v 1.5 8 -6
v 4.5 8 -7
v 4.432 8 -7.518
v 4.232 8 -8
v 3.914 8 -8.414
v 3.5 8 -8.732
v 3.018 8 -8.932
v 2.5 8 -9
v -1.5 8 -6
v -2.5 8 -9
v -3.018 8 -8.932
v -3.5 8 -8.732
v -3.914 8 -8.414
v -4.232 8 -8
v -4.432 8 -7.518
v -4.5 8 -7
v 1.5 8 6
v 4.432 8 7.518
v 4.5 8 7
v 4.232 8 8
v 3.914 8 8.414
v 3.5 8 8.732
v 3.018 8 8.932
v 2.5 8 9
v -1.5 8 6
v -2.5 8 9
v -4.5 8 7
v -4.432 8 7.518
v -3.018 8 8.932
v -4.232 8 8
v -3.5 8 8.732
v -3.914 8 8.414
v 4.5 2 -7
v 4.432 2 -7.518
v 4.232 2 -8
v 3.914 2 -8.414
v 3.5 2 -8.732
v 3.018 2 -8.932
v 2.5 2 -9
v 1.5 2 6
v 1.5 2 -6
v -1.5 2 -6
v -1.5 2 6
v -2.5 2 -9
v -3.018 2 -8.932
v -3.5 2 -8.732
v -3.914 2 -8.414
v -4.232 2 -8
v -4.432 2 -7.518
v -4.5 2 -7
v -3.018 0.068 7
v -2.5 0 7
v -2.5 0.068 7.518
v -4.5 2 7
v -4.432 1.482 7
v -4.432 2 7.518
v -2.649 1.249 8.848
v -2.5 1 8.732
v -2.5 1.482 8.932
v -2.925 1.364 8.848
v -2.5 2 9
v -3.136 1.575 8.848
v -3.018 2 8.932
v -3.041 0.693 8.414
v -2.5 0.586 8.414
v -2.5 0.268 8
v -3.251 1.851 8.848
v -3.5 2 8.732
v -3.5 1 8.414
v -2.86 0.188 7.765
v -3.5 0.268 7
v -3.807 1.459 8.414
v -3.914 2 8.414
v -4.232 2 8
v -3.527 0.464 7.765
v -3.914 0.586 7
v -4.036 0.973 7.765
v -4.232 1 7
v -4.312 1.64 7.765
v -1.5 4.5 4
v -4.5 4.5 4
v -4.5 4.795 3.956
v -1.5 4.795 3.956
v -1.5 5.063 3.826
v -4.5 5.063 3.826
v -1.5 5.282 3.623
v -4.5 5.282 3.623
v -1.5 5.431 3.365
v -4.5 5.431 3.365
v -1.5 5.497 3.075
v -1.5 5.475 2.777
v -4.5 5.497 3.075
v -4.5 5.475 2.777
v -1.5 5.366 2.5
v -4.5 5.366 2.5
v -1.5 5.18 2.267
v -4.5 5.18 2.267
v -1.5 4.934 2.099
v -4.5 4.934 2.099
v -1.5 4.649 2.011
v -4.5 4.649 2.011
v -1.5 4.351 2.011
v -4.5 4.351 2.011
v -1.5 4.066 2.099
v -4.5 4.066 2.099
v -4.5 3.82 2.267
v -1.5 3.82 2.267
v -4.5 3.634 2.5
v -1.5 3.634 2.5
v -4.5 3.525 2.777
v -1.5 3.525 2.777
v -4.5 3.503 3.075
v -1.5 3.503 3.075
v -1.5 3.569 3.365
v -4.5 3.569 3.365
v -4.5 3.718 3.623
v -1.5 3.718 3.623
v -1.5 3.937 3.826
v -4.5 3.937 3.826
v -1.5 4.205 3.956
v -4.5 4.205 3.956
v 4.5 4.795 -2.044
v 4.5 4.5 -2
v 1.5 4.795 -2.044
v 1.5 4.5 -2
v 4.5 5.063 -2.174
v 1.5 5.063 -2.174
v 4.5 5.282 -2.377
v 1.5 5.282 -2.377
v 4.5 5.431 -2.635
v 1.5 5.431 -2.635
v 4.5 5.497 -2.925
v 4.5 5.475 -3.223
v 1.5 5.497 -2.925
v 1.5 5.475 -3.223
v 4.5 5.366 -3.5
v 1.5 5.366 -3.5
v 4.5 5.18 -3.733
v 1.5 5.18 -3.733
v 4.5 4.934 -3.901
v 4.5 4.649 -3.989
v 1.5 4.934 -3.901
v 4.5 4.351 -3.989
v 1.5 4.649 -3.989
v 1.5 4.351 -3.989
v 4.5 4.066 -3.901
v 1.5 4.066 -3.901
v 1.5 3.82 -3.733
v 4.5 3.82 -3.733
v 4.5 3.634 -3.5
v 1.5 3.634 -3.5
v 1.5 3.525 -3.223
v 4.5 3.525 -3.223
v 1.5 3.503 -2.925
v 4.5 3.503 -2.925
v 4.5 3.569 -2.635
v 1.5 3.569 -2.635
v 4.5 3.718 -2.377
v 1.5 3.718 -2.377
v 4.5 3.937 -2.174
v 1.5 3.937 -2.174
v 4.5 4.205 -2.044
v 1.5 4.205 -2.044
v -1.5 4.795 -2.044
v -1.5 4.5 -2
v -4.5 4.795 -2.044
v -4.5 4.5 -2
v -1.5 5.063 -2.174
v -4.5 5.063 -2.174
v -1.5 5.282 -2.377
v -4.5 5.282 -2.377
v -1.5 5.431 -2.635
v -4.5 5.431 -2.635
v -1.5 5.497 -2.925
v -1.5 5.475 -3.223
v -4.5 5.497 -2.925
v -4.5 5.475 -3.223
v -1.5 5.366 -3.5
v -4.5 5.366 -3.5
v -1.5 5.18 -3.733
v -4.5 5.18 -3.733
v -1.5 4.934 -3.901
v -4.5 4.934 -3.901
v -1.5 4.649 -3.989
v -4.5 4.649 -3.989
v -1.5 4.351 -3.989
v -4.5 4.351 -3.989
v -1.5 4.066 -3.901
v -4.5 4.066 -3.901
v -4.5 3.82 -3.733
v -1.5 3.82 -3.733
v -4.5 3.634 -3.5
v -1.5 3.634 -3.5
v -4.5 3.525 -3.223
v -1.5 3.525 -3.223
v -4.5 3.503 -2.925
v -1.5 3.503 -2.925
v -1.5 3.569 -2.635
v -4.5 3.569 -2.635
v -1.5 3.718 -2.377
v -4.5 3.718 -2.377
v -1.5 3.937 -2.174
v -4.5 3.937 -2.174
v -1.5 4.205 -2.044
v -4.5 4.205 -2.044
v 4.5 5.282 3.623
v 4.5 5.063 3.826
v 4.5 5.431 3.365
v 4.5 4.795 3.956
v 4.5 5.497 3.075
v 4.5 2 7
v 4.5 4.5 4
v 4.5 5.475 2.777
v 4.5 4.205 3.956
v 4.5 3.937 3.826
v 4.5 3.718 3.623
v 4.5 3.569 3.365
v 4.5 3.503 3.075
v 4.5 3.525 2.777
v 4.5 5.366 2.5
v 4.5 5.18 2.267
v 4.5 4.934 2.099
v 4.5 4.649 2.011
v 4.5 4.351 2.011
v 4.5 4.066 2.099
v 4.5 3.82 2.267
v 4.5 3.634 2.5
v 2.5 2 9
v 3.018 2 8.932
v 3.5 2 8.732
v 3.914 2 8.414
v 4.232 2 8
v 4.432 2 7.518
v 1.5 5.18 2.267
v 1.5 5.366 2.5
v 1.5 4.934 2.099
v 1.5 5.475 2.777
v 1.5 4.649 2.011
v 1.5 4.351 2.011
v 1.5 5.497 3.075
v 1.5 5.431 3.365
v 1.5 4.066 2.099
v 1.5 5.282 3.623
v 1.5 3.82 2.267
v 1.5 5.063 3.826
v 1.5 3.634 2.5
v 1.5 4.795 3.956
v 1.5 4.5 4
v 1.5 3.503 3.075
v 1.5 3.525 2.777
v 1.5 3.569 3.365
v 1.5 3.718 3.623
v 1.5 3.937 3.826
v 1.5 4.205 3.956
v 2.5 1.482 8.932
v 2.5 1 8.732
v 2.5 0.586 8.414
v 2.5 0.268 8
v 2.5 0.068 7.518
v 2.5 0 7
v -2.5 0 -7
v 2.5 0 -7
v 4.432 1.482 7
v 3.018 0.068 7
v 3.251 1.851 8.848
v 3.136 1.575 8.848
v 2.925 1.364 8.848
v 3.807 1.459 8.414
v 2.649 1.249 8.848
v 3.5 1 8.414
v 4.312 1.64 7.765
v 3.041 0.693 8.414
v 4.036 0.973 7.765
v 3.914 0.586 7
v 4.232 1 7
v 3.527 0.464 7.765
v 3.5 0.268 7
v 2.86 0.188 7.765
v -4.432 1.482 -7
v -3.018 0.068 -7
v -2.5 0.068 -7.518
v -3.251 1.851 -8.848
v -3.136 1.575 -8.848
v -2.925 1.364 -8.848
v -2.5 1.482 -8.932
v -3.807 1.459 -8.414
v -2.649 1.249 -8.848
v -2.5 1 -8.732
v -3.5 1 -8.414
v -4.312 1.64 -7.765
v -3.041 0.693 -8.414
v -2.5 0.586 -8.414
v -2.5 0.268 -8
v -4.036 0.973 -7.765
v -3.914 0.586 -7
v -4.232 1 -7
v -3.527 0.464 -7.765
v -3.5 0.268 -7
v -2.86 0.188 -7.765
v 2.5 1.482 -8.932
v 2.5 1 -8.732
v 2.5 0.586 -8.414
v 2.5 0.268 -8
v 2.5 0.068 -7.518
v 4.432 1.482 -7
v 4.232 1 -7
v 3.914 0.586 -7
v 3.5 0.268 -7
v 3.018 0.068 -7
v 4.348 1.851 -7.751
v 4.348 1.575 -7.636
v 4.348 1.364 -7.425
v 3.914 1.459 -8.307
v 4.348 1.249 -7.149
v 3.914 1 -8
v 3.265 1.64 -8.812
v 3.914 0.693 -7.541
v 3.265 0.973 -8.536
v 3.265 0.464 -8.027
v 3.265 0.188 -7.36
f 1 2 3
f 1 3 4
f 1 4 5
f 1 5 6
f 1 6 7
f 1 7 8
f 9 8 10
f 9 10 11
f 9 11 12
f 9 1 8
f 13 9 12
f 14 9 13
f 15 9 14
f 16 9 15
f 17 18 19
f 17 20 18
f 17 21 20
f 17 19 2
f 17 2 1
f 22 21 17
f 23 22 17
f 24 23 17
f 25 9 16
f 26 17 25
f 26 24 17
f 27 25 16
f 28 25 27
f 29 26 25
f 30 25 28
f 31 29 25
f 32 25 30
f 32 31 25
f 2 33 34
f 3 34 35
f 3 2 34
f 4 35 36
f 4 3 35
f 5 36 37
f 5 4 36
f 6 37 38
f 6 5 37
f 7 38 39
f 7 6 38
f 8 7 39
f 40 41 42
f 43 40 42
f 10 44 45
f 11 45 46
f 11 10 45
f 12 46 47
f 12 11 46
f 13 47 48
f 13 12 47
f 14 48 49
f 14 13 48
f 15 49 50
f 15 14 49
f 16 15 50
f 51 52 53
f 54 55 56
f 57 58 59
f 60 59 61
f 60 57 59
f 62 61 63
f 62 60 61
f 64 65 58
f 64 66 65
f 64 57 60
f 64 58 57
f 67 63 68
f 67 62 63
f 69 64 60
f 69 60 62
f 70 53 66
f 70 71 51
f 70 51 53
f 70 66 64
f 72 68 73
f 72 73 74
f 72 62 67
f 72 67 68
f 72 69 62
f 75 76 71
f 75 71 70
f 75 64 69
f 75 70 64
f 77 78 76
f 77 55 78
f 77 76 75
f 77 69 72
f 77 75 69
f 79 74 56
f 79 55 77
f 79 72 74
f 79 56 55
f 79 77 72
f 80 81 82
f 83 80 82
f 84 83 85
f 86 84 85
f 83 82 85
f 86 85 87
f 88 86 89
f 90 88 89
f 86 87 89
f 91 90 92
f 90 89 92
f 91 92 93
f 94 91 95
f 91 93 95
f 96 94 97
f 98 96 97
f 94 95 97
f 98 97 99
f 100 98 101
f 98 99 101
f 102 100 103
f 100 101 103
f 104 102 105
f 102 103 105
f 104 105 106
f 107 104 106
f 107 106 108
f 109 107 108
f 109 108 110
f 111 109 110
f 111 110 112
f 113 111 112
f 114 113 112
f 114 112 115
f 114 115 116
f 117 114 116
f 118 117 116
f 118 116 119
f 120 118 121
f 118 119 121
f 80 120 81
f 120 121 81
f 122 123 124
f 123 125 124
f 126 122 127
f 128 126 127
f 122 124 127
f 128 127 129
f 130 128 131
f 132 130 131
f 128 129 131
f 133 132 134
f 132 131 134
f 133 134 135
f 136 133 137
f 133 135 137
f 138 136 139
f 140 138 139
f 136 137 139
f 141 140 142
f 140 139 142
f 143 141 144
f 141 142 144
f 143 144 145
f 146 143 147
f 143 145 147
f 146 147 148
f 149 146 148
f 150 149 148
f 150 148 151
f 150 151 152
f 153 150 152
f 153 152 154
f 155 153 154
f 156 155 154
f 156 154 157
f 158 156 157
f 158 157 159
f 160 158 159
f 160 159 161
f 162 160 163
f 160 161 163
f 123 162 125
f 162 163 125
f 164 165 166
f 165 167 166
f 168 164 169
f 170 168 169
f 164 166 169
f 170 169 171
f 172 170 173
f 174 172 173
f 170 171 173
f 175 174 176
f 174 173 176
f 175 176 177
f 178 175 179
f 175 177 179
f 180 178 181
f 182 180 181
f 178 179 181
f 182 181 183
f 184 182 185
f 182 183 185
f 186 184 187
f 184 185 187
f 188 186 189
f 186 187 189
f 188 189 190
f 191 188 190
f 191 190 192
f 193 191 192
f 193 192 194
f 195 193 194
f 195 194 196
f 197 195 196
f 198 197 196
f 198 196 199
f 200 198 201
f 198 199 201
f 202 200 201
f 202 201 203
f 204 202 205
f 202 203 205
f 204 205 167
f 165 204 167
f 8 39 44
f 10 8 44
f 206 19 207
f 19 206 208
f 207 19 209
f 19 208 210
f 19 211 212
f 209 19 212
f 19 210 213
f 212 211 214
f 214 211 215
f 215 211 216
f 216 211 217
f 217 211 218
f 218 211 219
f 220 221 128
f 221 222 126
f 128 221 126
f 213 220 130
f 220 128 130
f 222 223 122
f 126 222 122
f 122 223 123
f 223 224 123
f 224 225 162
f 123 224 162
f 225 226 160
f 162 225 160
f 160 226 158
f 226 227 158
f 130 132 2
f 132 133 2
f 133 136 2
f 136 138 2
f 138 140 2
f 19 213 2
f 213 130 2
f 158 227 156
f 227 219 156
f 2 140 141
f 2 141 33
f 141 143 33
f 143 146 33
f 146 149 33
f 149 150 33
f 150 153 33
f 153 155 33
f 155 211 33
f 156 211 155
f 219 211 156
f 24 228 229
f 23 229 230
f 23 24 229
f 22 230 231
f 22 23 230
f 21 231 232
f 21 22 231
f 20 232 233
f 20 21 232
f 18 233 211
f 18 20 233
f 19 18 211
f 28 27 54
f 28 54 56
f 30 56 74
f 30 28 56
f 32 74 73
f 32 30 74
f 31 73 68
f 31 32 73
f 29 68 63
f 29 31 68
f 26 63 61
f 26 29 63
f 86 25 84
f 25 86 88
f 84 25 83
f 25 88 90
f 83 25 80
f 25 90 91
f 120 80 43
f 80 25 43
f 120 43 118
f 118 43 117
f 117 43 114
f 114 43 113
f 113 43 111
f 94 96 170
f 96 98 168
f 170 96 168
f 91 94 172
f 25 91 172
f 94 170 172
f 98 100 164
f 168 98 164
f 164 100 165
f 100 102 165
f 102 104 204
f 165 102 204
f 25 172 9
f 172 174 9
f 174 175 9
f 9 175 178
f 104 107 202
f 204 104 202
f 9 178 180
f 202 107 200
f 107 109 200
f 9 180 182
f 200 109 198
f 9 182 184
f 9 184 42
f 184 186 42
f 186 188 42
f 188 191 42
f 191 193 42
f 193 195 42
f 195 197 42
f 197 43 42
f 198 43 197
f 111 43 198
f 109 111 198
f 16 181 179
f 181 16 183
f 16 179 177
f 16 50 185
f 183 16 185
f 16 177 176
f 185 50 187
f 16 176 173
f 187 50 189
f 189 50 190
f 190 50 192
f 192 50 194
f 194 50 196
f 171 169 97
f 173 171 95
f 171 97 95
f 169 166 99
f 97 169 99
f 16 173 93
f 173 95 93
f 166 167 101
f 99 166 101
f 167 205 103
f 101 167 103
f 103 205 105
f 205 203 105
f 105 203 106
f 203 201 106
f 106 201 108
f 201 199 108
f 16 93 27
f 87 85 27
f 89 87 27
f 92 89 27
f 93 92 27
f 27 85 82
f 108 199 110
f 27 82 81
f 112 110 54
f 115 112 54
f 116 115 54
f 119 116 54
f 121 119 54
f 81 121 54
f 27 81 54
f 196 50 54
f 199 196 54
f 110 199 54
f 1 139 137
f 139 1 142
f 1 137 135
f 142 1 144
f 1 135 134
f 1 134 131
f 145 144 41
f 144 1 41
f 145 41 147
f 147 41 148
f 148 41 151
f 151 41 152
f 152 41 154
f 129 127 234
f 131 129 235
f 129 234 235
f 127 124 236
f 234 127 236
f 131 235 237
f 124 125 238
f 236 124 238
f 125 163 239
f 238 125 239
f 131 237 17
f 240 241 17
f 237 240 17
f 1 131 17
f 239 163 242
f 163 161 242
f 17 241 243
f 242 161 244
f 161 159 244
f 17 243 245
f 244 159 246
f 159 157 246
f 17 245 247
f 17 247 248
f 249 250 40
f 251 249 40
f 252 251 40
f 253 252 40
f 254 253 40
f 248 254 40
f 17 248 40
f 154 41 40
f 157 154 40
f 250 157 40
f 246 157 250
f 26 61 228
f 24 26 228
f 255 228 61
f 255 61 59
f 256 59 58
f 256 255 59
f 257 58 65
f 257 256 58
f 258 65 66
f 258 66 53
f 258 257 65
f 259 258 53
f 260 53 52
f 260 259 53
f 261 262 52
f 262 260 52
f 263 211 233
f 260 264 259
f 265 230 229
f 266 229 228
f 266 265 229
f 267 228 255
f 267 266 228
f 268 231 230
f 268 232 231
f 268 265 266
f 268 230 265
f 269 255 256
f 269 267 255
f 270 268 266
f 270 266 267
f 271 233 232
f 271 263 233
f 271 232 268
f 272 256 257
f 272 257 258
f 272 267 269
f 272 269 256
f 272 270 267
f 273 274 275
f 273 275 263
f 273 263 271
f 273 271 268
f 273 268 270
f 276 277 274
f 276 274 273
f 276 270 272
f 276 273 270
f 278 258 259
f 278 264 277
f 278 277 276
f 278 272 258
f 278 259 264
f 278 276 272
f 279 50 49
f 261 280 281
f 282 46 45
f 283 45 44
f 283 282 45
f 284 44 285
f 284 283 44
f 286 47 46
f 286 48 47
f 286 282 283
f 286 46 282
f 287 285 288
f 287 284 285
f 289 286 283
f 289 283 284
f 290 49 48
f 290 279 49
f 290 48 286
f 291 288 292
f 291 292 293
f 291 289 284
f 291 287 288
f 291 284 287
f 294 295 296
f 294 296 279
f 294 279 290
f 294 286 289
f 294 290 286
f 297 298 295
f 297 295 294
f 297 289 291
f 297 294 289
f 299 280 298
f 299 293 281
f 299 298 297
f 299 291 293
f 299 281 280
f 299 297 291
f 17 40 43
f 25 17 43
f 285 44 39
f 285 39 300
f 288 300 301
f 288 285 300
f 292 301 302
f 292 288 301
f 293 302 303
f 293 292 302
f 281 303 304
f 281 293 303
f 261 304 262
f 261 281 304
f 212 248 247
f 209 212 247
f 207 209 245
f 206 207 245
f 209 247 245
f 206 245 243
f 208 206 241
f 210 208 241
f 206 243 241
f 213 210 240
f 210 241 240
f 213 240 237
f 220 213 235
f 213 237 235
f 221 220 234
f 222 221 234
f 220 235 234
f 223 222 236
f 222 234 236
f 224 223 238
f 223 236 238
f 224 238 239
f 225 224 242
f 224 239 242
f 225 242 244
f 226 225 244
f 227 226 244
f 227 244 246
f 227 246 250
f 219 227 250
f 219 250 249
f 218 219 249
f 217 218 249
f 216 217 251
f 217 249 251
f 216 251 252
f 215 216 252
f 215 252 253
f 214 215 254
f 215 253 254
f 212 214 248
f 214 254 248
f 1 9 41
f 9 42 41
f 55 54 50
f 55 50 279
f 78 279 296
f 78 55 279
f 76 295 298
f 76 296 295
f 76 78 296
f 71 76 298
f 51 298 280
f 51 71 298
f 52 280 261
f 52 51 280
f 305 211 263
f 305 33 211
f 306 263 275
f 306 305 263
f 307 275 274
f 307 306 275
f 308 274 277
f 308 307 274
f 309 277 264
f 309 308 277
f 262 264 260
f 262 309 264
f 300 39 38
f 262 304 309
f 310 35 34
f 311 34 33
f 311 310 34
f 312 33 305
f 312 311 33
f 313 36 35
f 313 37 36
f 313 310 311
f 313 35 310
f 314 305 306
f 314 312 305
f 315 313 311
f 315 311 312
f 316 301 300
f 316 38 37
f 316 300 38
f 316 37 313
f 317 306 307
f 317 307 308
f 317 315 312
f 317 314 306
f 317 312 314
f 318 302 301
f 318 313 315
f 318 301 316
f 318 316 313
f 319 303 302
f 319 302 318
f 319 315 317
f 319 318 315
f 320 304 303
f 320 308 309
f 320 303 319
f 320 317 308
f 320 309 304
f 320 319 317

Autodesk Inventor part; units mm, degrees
ref_plane "YZ Plane" through (0, 0, 0) normal (1, 0, 0) x (0, 1, 0)
ref_plane "XZ Plane" through (0, 0, 0) normal (0, 1, 0) x (-1, 0, 0)
ref_plane "XY Plane" through (0, 0, 0) normal (0, 0, 1) x (1, 0, 0)
sketch "Sketch2" plane through (0, 0, 0) normal (0, 1, 0) x (-1, 0, 0)
  line L0 (-1.5, 6) -> (1.5, 6)
  line L1 (1.5, 6) -> (1.5, -6)
  line L2 (1.5, -6) -> (-1.5, -6)
  line L3 (-1.5, -6) -> (-1.5, 6)
  line L4 (-1.5, 6) -> (1.5, -6) construction
  line L5 (1.5, 6) -> (-1.5, -6) construction
  line L6 (1.5, 0) -> (-1.5, 0)
  circle A0 centre (-1, 3) radius 0.8
  circle A1 centre (-1, -3) radius 0.8
  line L7 (-4.5, -9) -> (4.5, -9)
  line L8 (4.5, -9) -> (4.5, 9)
  line L9 (4.5, 9) -> (-4.5, 9)
  line L10 (-4.5, 9) -> (-4.5, -9)
  line L11 (-4.5, -9) -> (4.5, 9) construction
  line L12 (4.5, -9) -> (-4.5, 9) construction
  point P0 (0, 0)
  dimension "d2" = 3
  dimension "d3" = 12
  dimension "d4" = 1.6
  dimension "d5" = 2.5
  dimension "d6" = 3
  dimension "d7" = 9
  dimension "d8" = 18
extrude "Extrusion2" add sketch "Sketch2" along normal blind 2 contours L0 L1 L6 L3 A0 | A0 L3 | L1 L2 L3 A1 L6 | A1 L3 picked at (-1.0814, 3.2162) picked at (-1.0814, -2.7838)
extrude "Extrusion3" add sketch "Sketch2" along normal blind 8 contours L3 A0 | L3 A1 | L10 L9 L8 L7 picked at (-1.5421, 2.834) picked at (-1.5421, -3.166)
fillet "Fillet1" radius 2 8 edges at (-4.5, 0, 0) (0, 0, -9) (4.5, 0, 0) (0, 0, 9) (-4.5, 4, -9) (-4.5, 4, 9) (4.5, 4, 9) (4.5, 4, -9)
sketch "Sketch4" plane through (-4.5, 0, -9) normal (-1, 0, 0) x (0, 0, 1)
  line L0 (0, 0) -> (18, 0) construction
  line L1 (18, 0) -> (18, 8) construction
  line L2 (0, 0) -> (18, 0) construction
  line L3 (18, 0) -> (18, 2) construction
  line L4 (18, 2) -> (0, 2) construction
  line L5 (0, 2) -> (0, 0) construction
  line L6 (9, 0) -> (9, 8)
  line L7 (0, 8) -> (18, 8) construction
  circle A0 centre (6, 4.5) radius 1
  circle A1 centre (12, 4.5) radius 1
  dimension "d13" = 2
  dimension "d15" = 2
  dimension "d16" = 6
  dimension "d17" = 2.5
extrude "Extrusion4" cut sketch "Sketch4" against normal through all
properties part number "Part1_3DPrint"
